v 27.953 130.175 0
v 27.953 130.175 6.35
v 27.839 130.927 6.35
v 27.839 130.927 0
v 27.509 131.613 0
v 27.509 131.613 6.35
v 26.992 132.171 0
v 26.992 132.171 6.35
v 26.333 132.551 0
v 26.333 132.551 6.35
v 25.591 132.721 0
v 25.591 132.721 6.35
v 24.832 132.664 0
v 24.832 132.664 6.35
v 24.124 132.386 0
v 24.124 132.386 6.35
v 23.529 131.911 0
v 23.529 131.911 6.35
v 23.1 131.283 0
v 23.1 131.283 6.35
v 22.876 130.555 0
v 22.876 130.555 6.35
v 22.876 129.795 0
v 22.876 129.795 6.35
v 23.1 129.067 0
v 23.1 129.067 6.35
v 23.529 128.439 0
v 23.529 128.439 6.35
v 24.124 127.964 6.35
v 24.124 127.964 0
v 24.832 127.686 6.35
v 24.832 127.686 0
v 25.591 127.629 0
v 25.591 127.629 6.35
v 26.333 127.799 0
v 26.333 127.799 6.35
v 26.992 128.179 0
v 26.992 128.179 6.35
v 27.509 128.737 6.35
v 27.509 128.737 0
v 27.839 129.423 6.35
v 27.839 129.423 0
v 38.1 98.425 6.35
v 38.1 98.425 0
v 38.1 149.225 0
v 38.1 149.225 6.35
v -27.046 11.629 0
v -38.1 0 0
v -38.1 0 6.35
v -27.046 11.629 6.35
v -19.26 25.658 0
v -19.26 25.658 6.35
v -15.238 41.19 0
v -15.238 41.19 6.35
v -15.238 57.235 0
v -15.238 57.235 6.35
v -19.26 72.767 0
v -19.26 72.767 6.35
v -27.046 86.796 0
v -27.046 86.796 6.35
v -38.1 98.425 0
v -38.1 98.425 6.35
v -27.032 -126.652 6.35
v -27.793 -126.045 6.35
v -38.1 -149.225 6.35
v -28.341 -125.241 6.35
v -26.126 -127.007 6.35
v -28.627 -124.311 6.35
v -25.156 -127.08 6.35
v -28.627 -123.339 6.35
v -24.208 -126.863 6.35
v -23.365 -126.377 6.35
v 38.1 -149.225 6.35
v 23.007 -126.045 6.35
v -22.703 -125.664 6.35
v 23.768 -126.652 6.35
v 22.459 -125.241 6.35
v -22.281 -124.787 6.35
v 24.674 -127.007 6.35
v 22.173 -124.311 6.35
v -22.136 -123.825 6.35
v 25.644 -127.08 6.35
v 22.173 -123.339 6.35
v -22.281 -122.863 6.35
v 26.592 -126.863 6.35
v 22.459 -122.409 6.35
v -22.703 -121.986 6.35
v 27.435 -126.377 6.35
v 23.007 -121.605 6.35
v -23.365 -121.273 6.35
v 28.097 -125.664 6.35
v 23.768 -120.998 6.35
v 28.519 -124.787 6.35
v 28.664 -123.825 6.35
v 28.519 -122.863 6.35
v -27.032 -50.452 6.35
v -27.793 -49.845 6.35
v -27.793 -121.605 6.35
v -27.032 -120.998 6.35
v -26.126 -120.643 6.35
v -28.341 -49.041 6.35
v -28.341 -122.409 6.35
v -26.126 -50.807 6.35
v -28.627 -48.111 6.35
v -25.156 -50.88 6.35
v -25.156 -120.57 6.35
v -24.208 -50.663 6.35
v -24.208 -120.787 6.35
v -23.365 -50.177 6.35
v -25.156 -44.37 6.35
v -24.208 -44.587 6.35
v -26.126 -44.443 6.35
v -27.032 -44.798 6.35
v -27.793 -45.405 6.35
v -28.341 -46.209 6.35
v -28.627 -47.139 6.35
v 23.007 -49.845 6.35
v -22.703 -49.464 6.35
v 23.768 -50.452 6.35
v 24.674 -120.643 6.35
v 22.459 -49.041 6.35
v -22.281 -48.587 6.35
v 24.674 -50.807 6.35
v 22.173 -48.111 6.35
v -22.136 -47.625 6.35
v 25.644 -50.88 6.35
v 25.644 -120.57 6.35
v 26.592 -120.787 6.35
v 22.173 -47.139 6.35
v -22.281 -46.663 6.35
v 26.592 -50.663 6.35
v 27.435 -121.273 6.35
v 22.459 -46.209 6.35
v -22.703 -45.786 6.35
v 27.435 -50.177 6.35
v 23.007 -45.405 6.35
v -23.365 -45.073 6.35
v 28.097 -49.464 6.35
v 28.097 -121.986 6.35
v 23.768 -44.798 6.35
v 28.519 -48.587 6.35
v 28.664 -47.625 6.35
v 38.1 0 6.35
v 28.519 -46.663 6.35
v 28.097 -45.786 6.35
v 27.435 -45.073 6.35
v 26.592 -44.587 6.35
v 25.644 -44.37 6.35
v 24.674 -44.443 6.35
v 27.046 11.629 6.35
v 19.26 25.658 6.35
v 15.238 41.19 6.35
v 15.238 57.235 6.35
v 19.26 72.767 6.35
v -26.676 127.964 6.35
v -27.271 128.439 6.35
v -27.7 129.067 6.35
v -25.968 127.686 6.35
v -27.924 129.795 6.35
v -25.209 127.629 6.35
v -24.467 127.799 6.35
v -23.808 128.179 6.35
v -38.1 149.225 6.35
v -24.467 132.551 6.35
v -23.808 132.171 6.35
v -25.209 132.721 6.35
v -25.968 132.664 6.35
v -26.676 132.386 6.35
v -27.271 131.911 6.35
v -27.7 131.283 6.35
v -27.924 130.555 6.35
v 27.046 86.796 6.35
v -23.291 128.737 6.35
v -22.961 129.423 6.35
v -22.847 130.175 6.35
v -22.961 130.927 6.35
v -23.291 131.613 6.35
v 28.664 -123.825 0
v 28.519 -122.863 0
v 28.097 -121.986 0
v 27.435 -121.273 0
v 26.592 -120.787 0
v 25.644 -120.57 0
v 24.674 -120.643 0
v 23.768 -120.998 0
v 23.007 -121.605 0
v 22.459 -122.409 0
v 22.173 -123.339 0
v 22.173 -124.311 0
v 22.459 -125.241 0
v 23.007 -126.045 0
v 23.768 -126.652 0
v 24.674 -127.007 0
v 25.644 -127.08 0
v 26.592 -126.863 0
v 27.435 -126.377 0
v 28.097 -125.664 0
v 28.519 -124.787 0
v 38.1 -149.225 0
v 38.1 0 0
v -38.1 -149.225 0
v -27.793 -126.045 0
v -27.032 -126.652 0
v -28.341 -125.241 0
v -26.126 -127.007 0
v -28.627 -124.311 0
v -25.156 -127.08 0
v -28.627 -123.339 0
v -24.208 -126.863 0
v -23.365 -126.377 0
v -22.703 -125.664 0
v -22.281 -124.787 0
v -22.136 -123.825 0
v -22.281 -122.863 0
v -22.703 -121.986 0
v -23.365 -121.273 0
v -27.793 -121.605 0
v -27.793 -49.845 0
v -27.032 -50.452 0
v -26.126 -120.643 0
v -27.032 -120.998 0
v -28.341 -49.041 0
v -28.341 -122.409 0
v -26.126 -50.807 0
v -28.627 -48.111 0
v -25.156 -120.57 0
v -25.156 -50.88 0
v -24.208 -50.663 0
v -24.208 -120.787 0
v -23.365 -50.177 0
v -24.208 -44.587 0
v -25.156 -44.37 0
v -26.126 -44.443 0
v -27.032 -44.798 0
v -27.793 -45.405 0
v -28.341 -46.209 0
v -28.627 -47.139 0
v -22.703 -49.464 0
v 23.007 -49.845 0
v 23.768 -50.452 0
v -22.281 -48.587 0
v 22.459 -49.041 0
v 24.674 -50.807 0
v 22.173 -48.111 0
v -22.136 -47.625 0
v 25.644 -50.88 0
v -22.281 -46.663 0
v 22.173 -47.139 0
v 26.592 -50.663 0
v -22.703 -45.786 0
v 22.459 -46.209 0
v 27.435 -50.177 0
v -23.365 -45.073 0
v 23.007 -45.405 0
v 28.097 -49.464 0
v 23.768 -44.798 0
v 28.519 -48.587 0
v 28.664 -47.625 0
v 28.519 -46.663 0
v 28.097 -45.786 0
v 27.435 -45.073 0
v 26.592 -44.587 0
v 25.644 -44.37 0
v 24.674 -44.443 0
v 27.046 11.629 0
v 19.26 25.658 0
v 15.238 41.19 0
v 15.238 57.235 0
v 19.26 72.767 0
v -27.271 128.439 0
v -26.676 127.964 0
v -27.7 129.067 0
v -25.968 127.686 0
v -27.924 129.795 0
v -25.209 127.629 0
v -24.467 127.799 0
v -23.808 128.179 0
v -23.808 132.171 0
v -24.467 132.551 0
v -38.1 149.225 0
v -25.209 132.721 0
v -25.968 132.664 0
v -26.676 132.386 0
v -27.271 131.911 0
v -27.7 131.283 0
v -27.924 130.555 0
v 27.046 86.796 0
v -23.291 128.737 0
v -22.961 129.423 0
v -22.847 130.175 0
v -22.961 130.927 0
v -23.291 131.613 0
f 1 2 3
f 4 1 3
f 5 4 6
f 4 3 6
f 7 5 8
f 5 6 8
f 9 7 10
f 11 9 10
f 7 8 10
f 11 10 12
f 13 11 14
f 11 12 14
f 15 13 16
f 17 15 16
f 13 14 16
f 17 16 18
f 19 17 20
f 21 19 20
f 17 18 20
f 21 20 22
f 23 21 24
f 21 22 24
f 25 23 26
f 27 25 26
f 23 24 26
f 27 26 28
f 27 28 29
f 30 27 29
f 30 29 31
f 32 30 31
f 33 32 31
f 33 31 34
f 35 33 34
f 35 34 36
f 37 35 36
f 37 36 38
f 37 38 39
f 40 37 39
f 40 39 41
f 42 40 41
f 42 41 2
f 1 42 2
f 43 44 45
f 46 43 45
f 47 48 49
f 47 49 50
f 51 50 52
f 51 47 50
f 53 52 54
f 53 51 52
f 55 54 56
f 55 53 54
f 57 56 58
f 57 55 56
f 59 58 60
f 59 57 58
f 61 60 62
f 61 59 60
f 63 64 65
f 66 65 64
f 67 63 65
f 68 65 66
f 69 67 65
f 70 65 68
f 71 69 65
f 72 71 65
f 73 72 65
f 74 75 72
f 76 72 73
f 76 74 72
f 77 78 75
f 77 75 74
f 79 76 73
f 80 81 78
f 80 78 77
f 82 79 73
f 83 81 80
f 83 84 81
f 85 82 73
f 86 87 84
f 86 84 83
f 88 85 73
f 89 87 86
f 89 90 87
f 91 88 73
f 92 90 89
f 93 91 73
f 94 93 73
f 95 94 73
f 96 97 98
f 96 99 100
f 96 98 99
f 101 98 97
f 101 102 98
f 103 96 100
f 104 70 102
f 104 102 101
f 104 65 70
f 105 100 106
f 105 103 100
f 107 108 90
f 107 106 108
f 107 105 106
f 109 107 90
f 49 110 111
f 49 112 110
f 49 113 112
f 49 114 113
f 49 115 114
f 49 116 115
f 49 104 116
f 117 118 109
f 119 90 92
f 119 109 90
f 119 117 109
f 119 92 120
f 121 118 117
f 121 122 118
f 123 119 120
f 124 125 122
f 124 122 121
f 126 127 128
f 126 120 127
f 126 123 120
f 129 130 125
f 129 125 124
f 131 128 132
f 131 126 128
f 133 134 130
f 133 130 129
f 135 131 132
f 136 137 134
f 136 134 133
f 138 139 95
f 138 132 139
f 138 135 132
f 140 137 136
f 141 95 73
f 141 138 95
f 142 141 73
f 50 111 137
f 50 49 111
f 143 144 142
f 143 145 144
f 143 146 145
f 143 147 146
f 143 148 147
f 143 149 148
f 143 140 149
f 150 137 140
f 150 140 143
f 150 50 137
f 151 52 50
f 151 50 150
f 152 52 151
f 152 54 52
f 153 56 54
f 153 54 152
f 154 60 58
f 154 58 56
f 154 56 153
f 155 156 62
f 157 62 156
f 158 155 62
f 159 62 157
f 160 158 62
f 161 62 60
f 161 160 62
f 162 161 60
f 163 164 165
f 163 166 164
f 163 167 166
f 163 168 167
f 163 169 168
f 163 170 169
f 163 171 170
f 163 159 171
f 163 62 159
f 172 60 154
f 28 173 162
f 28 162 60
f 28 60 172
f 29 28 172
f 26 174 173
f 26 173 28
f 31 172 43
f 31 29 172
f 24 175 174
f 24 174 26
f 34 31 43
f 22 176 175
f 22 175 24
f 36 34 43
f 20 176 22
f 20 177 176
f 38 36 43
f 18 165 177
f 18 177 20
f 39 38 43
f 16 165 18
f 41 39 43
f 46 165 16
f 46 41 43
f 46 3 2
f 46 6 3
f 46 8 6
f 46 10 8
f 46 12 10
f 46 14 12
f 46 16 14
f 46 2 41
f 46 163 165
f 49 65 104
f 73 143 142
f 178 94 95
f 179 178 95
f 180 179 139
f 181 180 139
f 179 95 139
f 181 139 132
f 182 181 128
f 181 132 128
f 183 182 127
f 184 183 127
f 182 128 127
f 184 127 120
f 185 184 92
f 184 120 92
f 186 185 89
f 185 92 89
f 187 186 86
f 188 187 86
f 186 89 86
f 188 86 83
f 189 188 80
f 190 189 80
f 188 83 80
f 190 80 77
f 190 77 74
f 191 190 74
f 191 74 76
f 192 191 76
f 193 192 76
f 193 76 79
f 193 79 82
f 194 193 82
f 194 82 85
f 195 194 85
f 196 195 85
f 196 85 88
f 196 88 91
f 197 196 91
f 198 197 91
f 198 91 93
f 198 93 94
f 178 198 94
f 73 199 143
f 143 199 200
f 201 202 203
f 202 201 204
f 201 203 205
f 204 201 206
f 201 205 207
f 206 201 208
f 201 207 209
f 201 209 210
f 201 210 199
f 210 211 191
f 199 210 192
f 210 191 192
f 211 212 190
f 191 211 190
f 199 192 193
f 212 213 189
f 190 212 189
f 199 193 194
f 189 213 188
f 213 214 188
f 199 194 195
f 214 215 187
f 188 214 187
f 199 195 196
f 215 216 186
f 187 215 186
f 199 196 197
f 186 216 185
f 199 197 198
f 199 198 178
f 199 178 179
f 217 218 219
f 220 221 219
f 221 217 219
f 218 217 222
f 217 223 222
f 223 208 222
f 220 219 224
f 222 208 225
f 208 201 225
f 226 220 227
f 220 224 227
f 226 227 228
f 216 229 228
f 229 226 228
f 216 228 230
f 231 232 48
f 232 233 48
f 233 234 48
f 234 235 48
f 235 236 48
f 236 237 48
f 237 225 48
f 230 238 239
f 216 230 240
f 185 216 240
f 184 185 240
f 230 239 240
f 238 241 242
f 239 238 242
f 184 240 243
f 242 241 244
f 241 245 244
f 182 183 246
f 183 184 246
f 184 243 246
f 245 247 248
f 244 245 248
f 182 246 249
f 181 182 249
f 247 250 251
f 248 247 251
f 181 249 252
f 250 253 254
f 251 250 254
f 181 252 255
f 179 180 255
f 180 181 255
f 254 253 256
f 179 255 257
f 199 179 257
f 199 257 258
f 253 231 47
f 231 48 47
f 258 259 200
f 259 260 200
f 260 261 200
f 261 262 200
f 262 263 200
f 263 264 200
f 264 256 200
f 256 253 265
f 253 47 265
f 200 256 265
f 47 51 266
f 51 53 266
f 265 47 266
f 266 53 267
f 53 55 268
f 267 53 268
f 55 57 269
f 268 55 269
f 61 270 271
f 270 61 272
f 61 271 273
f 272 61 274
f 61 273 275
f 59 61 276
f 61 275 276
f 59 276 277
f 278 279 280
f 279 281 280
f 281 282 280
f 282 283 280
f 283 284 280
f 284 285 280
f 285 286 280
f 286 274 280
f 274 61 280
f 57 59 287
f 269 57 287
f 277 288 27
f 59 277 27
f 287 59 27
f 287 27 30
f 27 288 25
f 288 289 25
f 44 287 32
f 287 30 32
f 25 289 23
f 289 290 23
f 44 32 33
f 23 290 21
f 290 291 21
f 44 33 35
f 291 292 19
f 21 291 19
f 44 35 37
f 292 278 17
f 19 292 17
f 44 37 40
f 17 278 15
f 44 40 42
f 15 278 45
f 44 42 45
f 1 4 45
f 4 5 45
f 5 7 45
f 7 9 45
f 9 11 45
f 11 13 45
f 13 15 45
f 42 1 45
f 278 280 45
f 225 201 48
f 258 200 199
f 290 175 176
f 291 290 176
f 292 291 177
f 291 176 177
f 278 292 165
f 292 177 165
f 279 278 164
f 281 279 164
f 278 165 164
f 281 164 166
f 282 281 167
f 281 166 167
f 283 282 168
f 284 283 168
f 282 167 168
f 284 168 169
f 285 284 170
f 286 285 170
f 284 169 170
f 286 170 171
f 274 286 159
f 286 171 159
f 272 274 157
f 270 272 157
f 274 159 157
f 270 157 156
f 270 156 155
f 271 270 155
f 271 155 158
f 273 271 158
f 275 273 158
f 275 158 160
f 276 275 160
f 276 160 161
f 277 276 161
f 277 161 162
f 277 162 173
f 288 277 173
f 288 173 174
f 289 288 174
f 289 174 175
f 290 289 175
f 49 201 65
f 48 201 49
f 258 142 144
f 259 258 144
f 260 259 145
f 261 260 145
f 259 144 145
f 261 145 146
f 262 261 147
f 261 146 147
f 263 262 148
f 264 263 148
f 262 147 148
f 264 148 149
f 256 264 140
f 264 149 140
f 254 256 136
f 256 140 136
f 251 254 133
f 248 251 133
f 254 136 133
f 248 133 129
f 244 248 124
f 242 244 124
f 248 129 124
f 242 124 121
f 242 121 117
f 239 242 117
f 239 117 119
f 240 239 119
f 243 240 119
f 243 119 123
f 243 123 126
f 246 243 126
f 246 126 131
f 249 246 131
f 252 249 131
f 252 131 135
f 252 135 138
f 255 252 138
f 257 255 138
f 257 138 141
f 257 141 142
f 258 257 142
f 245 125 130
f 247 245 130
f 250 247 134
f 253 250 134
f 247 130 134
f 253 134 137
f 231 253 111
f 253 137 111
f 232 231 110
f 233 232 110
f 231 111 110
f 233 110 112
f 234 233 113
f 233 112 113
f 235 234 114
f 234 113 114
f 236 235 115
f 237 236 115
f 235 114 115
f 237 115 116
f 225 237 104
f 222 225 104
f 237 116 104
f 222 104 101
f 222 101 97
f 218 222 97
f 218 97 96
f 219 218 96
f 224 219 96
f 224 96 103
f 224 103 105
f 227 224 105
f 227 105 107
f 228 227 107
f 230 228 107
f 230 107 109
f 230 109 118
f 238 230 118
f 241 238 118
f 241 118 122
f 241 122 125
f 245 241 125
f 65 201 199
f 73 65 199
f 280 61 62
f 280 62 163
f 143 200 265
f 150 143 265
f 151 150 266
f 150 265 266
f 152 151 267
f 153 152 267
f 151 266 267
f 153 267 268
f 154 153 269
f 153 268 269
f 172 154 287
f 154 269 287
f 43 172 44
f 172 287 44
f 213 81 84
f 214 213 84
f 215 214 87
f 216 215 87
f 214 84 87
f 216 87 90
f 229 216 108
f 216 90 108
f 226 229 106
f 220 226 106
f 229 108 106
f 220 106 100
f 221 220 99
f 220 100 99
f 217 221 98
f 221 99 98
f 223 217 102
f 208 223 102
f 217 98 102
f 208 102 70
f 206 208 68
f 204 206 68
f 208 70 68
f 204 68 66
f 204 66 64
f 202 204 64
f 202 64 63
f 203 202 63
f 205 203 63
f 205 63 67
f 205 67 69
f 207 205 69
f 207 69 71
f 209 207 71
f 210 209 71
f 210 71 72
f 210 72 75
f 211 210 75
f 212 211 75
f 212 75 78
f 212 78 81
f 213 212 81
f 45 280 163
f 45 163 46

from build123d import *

# Parameters (mm, degrees)
SKETCH1_W                   = 76.2
SKETCH1_H                   = 298.45
BOSS_EXTRUDE1_DEPTH         = 6.35
F_1_4_20_TAPPED_HOLE1_D     = 5.1054
F_1_4_20_TAPPED_HOLE1_DEPTH = 6.35
CUT_EXTRUDE1_DEPTH          = 7.35
F_0_257_DIAMETER_HOLE1_D    = 6.5278


with BuildPart() as part:
    # Sketch1 → Boss-Extrude1 (new body)
    with BuildSketch(Plane.XY):
        Rectangle(SKETCH1_W, SKETCH1_H)
    extrude(amount=BOSS_EXTRUDE1_DEPTH)

    # 1/4-20 Tapped Hole1
    with Locations(Plane(origin=(0, 0, 0), x_dir=(-1, 0, 0), z_dir=(0, 0, -1))):
        with Locations((-25.4, 130.175), (25.4, 130.175), (25.4, -47.625), (25.4, -123.825), (-25.4, -123.825), (-25.4, -47.625)):
            Hole(F_1_4_20_TAPPED_HOLE1_D / 2, depth=F_1_4_20_TAPPED_HOLE1_DEPTH)

    # Sketch6 → Cut-Extrude1 (cut, through all)
    with BuildSketch(Plane(origin=(0, 0, 0), x_dir=(-1, 0, 0), z_dir=(0, 0, -1))):
        with BuildLine():
            Line((-38.1, 98.425), (-38.1, 0))
            ThreePointArc((-38.1, 0), (-14.729538295, 49.2125), (-38.1, 98.425))
        make_face()
        with BuildLine():
            Line((38.1, 98.425), (38.1, 0))
            ThreePointArc((38.1, 0), (14.729538295, 49.2125), (38.1, 98.425))
        make_face()
    extrude(amount=-CUT_EXTRUDE1_DEPTH, mode=Mode.SUBTRACT)

    # F (0.257) Diameter Hole1 (through all)
    with Locations(Plane(origin=(0, 0, 0), x_dir=(-1, 0, 0), z_dir=(0, 0, -1))):
        with Locations((-25.4, -47.625), (25.4, -47.625), (25.4, -123.825), (-25.4, -123.825)):
            Hole(F_0_257_DIAMETER_HOLE1_D / 2)


solid = part.part
